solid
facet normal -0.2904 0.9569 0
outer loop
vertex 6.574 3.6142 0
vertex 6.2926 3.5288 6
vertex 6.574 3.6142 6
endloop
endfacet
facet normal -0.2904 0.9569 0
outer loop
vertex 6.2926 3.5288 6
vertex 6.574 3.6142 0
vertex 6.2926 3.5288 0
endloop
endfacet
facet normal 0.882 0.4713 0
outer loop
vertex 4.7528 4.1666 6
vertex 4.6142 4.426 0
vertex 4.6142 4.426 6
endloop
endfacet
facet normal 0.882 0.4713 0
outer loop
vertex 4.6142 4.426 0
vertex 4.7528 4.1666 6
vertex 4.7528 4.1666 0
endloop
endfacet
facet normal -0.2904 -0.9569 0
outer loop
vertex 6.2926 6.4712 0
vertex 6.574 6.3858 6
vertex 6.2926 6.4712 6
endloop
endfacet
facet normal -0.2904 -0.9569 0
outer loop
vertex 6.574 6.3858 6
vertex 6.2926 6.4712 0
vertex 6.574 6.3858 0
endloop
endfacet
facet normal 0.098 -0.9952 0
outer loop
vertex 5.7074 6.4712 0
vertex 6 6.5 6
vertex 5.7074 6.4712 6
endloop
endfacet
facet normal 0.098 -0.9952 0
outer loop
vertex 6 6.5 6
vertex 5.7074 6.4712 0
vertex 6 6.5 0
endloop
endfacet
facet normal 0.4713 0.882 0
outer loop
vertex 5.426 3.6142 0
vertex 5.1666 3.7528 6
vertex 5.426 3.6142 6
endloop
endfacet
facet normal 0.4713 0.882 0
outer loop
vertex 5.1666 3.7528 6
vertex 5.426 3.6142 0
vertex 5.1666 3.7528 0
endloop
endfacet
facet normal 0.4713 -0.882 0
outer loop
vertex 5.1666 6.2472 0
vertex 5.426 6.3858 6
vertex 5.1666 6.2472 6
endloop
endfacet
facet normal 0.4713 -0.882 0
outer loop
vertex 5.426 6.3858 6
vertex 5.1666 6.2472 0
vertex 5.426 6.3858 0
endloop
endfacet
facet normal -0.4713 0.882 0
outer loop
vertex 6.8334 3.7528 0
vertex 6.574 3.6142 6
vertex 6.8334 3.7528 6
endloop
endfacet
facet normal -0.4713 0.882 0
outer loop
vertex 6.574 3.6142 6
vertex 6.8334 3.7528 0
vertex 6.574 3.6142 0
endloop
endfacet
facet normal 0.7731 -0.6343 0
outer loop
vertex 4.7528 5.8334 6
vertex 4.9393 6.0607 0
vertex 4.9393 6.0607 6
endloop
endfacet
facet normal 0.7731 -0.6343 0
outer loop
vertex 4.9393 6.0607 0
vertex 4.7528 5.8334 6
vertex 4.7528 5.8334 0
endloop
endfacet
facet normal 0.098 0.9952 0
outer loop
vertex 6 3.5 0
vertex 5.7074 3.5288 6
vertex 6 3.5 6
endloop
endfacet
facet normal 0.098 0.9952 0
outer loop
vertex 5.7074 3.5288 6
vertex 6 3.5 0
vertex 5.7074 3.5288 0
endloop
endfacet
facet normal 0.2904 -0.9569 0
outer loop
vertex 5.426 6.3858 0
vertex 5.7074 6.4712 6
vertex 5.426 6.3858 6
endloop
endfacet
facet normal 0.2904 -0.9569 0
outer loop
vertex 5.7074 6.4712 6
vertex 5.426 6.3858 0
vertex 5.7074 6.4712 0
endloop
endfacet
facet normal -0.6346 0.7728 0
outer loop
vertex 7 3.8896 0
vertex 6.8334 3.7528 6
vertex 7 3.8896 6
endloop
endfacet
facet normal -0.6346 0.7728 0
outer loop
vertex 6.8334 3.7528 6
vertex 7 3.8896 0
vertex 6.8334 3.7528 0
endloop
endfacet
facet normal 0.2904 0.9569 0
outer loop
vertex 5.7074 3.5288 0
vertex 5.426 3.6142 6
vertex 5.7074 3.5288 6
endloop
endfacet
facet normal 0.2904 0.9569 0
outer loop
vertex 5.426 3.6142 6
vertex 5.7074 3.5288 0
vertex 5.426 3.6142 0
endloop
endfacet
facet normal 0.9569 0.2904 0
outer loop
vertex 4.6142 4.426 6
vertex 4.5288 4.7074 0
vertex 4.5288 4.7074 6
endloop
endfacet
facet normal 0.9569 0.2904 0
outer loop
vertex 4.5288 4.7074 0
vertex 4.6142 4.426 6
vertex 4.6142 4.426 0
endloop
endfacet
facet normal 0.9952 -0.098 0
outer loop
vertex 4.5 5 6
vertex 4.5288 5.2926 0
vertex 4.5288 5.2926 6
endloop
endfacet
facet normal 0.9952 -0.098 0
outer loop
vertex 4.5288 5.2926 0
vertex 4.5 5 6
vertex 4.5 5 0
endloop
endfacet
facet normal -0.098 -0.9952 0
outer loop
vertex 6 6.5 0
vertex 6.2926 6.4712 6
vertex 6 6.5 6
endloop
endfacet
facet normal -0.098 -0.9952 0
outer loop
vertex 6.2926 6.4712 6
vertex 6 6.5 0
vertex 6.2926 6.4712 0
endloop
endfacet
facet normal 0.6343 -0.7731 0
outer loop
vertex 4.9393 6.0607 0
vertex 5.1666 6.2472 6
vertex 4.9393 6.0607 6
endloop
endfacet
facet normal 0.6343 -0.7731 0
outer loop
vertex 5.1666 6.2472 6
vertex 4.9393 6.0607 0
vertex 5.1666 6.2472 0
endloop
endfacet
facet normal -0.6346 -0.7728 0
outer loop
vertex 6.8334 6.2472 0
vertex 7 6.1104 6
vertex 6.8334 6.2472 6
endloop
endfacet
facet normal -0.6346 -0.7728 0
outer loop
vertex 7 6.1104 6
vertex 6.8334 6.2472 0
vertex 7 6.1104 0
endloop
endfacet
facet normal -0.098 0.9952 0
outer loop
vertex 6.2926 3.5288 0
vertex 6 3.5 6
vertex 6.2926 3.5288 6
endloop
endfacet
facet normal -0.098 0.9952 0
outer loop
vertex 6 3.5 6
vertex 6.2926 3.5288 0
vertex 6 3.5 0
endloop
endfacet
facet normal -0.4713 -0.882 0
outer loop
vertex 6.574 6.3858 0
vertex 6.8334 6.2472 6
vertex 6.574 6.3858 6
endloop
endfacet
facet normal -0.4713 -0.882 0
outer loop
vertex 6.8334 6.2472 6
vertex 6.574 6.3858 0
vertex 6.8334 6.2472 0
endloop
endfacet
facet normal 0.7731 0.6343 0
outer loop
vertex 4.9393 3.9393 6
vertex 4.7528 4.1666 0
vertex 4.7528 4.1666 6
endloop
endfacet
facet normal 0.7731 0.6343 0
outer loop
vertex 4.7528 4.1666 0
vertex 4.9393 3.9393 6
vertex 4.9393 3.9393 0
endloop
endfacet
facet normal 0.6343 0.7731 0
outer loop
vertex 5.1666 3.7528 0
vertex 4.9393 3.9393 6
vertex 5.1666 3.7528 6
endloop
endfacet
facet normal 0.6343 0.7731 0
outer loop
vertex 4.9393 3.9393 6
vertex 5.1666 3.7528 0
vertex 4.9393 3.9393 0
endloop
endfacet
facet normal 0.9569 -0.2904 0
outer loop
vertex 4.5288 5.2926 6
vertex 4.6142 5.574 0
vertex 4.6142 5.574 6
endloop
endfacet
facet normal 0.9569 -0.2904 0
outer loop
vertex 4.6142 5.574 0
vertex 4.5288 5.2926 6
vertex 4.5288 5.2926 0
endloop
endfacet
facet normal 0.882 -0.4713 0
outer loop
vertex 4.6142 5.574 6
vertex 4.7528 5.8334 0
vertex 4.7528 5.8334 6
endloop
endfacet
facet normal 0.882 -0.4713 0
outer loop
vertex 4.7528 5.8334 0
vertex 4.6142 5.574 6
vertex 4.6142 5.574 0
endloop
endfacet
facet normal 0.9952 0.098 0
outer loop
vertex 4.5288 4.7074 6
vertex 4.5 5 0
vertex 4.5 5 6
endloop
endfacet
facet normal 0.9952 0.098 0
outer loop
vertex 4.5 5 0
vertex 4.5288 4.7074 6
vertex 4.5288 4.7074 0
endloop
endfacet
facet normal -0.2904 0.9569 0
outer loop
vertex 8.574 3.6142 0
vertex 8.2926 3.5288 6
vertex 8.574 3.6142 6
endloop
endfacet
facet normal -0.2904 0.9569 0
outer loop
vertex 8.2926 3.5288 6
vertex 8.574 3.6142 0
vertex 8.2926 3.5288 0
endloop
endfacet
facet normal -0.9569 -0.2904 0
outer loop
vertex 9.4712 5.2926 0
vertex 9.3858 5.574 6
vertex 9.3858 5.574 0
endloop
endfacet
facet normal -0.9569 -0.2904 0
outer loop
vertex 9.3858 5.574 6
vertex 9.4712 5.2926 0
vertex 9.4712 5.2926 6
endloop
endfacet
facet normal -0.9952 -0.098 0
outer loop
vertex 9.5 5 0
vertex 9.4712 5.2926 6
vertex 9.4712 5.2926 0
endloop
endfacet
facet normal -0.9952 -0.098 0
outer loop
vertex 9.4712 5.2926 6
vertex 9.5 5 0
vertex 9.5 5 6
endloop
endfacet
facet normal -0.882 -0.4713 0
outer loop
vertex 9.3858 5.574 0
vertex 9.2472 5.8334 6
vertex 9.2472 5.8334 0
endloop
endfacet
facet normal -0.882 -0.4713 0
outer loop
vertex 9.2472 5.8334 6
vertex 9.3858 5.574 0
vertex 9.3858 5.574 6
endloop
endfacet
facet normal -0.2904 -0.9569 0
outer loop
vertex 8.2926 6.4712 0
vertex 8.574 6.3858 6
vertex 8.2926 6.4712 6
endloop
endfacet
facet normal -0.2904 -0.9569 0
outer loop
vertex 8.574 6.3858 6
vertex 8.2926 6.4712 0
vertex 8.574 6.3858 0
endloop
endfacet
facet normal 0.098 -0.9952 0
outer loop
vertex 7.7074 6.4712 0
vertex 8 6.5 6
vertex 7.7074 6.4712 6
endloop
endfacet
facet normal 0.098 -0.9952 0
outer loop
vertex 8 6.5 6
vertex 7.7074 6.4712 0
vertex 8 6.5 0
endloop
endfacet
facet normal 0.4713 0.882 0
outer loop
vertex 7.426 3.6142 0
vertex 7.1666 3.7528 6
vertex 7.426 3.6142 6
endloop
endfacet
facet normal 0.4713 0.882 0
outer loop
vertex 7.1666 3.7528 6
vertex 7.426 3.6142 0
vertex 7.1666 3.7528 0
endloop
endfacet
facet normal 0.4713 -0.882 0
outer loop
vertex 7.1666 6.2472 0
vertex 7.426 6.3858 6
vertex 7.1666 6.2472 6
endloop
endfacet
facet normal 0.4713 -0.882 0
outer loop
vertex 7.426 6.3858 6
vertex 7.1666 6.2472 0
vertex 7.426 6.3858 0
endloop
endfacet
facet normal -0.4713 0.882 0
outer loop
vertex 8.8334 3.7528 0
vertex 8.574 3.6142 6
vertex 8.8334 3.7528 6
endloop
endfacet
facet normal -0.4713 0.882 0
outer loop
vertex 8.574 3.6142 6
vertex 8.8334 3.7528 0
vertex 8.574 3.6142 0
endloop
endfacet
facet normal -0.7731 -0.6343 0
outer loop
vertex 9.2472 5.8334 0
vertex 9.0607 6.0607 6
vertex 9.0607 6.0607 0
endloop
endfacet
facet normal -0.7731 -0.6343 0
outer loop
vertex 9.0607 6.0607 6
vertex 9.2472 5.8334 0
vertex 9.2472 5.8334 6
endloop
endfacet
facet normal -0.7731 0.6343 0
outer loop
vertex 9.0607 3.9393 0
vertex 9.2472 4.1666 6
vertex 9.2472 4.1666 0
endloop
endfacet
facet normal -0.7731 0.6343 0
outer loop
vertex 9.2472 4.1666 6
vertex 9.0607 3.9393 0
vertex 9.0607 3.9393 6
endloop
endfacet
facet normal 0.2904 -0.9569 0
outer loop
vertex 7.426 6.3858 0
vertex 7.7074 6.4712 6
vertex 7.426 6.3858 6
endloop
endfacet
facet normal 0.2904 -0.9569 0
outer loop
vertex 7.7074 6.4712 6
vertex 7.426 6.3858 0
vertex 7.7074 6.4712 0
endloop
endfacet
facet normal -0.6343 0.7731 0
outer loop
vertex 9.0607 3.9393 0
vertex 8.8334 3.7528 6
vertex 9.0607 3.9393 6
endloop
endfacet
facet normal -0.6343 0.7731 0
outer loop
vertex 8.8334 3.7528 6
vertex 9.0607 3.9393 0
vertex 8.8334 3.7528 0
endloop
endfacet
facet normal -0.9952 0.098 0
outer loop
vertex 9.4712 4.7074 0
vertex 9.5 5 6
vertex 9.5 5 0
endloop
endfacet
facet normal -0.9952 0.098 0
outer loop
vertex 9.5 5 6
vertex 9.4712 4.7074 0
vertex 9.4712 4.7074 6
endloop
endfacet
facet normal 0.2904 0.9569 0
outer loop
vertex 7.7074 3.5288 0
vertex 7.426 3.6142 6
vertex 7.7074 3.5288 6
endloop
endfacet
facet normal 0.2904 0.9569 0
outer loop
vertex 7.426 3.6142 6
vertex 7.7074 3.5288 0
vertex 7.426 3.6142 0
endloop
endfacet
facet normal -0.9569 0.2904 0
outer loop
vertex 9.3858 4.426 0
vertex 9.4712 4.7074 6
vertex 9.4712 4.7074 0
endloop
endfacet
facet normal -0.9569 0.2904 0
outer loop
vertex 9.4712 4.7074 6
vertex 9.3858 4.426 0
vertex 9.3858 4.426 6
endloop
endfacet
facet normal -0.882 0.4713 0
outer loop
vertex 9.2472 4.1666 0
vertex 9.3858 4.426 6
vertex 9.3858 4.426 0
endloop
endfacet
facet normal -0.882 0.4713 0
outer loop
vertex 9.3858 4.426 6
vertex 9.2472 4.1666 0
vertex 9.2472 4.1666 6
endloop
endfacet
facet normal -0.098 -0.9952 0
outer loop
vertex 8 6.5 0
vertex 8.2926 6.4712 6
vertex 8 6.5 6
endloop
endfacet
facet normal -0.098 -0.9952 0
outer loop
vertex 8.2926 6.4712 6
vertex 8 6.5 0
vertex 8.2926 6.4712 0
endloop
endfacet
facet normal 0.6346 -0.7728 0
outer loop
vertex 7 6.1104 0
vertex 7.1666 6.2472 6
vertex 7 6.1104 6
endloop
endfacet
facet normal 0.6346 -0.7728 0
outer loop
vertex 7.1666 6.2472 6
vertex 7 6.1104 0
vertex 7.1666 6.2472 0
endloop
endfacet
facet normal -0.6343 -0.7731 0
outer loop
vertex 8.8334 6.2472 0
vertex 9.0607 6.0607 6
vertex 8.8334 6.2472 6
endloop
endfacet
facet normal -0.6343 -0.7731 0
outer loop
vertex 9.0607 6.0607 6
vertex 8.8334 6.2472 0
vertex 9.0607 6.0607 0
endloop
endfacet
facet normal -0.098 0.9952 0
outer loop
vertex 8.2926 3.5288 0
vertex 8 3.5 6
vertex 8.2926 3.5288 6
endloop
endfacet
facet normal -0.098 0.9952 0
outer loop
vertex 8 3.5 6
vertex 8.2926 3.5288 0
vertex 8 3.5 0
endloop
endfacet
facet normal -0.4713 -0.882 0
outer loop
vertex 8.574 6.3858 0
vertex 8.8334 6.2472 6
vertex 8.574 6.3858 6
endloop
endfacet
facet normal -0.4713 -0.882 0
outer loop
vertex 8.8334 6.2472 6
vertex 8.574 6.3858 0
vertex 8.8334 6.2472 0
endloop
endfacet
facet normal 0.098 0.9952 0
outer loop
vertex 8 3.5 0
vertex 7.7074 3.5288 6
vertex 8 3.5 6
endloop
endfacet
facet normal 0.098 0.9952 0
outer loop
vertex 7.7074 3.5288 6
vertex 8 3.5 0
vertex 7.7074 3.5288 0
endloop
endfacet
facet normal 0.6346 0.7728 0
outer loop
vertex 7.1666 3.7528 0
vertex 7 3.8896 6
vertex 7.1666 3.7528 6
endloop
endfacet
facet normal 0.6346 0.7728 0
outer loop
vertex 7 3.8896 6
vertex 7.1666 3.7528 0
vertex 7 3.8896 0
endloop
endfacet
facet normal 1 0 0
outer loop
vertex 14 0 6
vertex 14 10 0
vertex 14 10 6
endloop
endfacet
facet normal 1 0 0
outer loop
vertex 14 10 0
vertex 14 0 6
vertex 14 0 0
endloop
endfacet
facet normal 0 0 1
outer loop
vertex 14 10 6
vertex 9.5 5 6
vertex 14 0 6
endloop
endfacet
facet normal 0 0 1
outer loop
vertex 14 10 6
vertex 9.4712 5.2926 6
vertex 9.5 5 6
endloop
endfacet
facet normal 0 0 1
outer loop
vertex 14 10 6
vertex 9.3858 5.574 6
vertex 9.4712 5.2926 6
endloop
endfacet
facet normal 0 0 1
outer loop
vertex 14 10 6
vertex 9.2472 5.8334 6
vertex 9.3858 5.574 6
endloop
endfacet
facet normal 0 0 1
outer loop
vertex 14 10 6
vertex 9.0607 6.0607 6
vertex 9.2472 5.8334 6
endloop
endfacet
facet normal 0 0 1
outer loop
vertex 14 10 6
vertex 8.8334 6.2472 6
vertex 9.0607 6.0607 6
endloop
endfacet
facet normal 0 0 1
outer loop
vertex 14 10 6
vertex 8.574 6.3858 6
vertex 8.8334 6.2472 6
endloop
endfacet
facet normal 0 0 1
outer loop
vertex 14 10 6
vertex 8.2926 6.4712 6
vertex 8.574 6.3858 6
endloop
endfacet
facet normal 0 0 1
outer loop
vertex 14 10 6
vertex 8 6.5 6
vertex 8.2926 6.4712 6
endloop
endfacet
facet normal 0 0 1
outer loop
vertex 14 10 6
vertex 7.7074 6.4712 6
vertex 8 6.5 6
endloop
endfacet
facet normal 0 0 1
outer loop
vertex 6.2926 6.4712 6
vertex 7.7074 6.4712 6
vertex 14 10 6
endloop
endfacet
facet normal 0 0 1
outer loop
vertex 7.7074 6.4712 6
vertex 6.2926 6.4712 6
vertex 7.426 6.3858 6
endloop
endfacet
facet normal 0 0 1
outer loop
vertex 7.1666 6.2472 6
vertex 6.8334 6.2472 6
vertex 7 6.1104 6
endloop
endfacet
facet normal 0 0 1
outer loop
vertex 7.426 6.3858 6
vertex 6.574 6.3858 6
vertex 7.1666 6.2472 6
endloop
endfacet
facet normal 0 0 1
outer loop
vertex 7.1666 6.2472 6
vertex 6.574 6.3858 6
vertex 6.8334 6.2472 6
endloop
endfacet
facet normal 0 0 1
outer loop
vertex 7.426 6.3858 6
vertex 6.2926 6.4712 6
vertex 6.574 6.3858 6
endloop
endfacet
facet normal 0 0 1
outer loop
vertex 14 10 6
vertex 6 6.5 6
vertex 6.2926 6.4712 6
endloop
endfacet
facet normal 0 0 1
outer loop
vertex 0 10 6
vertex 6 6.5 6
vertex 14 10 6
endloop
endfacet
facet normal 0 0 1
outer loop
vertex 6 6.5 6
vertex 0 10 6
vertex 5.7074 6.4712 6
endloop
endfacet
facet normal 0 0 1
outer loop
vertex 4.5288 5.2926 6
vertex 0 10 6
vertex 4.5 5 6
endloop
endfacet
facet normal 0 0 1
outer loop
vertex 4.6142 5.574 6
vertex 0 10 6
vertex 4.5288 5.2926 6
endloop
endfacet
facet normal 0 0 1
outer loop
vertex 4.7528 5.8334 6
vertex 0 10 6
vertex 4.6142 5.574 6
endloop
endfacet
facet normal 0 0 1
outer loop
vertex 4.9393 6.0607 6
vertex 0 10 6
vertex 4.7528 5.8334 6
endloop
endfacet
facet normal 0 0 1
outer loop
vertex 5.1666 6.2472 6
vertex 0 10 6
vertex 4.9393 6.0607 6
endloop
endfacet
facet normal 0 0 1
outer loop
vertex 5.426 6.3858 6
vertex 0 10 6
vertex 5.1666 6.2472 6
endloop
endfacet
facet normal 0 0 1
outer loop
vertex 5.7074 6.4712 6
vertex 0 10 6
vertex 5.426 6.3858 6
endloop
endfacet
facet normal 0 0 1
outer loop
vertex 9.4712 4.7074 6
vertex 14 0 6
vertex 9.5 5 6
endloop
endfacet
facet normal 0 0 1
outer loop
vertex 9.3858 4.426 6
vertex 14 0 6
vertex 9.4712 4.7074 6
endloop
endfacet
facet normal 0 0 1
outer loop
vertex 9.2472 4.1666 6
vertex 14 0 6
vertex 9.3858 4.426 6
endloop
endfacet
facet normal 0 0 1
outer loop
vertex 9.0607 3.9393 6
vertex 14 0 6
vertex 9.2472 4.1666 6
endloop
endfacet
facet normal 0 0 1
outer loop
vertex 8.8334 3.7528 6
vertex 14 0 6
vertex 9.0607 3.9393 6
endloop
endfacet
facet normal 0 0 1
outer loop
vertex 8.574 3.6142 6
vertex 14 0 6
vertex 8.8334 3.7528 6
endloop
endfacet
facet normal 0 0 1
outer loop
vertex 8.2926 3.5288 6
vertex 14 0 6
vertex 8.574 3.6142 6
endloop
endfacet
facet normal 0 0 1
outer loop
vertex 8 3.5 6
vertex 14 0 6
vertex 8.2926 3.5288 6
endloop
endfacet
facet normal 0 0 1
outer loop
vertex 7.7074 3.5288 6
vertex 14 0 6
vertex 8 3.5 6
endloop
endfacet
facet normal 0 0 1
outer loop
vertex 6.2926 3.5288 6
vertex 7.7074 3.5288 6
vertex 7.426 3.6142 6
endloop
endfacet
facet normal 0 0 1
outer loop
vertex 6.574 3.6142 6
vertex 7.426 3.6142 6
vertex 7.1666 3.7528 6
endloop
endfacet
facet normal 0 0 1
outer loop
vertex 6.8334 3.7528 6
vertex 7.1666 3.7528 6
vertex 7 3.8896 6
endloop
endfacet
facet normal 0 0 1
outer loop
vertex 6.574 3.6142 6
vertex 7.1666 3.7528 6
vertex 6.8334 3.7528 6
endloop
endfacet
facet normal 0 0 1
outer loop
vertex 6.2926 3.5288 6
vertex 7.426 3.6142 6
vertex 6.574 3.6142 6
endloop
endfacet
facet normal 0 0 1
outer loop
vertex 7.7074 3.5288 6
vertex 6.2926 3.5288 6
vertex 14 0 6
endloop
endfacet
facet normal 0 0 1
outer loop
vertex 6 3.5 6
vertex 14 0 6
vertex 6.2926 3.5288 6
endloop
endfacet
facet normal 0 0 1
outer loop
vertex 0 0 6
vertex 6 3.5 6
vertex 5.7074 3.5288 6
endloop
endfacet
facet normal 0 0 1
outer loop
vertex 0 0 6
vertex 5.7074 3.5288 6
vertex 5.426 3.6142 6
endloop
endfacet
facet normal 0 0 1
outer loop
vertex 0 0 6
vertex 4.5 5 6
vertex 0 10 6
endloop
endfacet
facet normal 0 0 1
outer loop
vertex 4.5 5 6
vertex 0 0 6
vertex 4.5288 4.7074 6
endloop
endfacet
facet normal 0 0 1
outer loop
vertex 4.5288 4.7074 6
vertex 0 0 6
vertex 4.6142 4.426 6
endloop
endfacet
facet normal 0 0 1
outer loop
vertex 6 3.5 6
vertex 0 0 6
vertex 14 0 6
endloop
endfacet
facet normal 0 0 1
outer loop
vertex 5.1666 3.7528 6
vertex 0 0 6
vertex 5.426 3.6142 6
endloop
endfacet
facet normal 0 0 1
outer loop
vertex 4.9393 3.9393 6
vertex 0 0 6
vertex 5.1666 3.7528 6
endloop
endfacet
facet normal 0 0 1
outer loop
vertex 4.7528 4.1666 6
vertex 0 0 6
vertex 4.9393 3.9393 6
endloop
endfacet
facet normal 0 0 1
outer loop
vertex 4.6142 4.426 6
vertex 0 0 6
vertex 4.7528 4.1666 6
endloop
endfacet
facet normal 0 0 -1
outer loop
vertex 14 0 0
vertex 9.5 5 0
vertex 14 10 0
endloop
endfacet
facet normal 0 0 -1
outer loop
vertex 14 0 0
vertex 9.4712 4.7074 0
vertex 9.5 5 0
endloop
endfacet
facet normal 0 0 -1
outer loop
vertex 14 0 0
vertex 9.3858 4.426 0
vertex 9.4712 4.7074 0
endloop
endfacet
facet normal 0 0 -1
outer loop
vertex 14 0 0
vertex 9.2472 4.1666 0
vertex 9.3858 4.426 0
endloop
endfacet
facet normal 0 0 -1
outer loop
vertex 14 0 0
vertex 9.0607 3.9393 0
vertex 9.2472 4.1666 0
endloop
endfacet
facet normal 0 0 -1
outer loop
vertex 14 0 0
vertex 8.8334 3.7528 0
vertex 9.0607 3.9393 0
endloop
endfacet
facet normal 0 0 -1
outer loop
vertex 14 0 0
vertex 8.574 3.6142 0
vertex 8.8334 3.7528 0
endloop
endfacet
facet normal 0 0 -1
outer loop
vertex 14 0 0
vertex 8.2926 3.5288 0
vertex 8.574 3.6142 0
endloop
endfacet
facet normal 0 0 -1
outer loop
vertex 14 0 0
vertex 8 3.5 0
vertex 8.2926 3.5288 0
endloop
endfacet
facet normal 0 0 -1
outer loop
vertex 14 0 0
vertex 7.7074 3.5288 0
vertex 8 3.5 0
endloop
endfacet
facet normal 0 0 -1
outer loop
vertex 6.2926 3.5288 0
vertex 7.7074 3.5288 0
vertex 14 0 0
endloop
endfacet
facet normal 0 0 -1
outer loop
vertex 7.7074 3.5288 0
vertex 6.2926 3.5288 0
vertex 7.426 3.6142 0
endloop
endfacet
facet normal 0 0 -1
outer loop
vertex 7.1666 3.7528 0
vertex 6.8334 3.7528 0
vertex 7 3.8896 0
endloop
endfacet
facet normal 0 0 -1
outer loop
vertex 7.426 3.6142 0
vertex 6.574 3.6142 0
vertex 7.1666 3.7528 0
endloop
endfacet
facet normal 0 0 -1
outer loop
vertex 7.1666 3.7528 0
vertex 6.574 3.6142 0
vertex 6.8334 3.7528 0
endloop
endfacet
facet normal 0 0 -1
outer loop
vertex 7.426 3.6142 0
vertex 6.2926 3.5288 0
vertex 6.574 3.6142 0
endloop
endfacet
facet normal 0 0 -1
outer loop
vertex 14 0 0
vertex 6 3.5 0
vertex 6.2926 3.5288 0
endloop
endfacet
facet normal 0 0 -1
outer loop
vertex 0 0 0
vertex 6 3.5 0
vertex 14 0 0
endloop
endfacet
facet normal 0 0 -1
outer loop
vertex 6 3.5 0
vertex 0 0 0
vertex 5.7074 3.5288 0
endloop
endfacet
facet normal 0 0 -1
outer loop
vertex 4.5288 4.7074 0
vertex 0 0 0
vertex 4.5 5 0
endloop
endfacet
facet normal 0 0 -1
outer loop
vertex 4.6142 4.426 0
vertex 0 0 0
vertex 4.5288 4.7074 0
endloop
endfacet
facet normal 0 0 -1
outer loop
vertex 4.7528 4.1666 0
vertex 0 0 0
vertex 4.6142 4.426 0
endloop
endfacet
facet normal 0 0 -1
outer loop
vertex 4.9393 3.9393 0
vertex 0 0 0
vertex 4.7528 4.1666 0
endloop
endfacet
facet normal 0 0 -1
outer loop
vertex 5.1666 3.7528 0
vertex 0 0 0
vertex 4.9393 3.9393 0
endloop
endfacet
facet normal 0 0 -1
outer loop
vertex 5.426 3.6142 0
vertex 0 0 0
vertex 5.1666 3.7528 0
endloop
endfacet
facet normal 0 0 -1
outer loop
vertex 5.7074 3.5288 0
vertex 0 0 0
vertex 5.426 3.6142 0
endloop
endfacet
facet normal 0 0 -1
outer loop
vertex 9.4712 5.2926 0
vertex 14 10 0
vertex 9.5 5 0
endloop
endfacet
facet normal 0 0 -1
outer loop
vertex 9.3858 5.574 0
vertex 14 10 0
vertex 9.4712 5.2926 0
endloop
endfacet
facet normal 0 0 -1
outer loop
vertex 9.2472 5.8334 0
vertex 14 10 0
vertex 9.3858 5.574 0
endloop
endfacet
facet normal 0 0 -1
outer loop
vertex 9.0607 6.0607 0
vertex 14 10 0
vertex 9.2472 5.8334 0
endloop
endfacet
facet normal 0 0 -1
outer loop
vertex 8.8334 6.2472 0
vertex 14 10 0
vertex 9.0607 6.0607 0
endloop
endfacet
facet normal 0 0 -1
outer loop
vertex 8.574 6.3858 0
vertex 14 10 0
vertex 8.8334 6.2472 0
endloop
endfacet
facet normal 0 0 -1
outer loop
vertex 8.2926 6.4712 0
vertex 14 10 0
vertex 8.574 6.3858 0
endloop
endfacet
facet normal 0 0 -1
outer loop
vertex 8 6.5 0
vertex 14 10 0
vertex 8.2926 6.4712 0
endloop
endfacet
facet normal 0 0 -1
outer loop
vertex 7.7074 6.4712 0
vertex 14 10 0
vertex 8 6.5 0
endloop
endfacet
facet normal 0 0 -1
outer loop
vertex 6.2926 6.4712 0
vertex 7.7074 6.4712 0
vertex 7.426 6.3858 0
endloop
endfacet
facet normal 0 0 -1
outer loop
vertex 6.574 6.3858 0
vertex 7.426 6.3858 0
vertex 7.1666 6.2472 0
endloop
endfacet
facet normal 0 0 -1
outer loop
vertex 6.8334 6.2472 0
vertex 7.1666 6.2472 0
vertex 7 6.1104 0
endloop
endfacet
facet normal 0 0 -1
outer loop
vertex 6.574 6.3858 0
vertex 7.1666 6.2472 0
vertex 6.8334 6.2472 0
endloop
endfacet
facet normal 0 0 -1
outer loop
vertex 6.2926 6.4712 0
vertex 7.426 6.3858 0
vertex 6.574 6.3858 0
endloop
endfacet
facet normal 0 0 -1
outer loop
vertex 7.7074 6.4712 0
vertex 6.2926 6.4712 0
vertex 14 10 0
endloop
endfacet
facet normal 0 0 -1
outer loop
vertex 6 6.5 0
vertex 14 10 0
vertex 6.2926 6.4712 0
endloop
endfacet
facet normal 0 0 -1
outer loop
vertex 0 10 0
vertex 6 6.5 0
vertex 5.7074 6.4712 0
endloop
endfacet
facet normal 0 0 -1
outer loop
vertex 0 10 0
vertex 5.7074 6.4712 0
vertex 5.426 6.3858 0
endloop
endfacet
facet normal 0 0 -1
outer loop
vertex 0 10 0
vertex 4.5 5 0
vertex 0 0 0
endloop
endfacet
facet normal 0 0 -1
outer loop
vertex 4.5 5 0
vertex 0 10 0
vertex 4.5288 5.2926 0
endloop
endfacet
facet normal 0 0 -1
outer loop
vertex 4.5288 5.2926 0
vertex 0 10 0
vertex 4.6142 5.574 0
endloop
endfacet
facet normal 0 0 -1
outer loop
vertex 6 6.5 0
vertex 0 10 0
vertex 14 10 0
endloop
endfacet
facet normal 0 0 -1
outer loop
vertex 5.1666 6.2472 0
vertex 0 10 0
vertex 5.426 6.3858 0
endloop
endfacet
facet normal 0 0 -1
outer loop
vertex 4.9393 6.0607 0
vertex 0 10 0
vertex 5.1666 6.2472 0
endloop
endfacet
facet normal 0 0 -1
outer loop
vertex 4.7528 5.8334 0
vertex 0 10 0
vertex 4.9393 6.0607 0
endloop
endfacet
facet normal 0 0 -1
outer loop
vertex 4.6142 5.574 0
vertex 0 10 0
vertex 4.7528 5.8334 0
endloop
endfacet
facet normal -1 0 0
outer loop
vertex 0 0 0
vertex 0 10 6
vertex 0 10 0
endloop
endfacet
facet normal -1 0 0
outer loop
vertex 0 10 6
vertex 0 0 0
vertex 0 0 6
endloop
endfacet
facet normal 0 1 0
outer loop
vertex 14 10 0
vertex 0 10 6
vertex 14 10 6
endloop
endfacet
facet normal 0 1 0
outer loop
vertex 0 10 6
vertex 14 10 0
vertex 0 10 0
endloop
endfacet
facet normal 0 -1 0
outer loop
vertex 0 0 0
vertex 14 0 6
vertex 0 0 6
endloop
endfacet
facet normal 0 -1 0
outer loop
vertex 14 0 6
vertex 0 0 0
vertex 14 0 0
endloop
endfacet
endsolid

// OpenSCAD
$fn = 32;

// ----------------------------------------------------------------------
// Micro pad: two-hole pad, 5-20 mm class
// ----------------------------------------------------------------------

// --- parameters (mm) ---
pad_l = 14;               // pad length, X
pad_w = 10;               // pad width, Y
pad_t = 6;                // pad thickness, Z
hole_d = 3;               // hole diameter
hole_x = 6;               // X of the first hole centre

difference() {
  cube([pad_l, pad_w, pad_t]);
  for (x = [hole_x, pad_l - hole_x])
    translate([x, pad_w / 2, -1])
      cylinder(h = pad_t + 2, d = hole_d);
}
